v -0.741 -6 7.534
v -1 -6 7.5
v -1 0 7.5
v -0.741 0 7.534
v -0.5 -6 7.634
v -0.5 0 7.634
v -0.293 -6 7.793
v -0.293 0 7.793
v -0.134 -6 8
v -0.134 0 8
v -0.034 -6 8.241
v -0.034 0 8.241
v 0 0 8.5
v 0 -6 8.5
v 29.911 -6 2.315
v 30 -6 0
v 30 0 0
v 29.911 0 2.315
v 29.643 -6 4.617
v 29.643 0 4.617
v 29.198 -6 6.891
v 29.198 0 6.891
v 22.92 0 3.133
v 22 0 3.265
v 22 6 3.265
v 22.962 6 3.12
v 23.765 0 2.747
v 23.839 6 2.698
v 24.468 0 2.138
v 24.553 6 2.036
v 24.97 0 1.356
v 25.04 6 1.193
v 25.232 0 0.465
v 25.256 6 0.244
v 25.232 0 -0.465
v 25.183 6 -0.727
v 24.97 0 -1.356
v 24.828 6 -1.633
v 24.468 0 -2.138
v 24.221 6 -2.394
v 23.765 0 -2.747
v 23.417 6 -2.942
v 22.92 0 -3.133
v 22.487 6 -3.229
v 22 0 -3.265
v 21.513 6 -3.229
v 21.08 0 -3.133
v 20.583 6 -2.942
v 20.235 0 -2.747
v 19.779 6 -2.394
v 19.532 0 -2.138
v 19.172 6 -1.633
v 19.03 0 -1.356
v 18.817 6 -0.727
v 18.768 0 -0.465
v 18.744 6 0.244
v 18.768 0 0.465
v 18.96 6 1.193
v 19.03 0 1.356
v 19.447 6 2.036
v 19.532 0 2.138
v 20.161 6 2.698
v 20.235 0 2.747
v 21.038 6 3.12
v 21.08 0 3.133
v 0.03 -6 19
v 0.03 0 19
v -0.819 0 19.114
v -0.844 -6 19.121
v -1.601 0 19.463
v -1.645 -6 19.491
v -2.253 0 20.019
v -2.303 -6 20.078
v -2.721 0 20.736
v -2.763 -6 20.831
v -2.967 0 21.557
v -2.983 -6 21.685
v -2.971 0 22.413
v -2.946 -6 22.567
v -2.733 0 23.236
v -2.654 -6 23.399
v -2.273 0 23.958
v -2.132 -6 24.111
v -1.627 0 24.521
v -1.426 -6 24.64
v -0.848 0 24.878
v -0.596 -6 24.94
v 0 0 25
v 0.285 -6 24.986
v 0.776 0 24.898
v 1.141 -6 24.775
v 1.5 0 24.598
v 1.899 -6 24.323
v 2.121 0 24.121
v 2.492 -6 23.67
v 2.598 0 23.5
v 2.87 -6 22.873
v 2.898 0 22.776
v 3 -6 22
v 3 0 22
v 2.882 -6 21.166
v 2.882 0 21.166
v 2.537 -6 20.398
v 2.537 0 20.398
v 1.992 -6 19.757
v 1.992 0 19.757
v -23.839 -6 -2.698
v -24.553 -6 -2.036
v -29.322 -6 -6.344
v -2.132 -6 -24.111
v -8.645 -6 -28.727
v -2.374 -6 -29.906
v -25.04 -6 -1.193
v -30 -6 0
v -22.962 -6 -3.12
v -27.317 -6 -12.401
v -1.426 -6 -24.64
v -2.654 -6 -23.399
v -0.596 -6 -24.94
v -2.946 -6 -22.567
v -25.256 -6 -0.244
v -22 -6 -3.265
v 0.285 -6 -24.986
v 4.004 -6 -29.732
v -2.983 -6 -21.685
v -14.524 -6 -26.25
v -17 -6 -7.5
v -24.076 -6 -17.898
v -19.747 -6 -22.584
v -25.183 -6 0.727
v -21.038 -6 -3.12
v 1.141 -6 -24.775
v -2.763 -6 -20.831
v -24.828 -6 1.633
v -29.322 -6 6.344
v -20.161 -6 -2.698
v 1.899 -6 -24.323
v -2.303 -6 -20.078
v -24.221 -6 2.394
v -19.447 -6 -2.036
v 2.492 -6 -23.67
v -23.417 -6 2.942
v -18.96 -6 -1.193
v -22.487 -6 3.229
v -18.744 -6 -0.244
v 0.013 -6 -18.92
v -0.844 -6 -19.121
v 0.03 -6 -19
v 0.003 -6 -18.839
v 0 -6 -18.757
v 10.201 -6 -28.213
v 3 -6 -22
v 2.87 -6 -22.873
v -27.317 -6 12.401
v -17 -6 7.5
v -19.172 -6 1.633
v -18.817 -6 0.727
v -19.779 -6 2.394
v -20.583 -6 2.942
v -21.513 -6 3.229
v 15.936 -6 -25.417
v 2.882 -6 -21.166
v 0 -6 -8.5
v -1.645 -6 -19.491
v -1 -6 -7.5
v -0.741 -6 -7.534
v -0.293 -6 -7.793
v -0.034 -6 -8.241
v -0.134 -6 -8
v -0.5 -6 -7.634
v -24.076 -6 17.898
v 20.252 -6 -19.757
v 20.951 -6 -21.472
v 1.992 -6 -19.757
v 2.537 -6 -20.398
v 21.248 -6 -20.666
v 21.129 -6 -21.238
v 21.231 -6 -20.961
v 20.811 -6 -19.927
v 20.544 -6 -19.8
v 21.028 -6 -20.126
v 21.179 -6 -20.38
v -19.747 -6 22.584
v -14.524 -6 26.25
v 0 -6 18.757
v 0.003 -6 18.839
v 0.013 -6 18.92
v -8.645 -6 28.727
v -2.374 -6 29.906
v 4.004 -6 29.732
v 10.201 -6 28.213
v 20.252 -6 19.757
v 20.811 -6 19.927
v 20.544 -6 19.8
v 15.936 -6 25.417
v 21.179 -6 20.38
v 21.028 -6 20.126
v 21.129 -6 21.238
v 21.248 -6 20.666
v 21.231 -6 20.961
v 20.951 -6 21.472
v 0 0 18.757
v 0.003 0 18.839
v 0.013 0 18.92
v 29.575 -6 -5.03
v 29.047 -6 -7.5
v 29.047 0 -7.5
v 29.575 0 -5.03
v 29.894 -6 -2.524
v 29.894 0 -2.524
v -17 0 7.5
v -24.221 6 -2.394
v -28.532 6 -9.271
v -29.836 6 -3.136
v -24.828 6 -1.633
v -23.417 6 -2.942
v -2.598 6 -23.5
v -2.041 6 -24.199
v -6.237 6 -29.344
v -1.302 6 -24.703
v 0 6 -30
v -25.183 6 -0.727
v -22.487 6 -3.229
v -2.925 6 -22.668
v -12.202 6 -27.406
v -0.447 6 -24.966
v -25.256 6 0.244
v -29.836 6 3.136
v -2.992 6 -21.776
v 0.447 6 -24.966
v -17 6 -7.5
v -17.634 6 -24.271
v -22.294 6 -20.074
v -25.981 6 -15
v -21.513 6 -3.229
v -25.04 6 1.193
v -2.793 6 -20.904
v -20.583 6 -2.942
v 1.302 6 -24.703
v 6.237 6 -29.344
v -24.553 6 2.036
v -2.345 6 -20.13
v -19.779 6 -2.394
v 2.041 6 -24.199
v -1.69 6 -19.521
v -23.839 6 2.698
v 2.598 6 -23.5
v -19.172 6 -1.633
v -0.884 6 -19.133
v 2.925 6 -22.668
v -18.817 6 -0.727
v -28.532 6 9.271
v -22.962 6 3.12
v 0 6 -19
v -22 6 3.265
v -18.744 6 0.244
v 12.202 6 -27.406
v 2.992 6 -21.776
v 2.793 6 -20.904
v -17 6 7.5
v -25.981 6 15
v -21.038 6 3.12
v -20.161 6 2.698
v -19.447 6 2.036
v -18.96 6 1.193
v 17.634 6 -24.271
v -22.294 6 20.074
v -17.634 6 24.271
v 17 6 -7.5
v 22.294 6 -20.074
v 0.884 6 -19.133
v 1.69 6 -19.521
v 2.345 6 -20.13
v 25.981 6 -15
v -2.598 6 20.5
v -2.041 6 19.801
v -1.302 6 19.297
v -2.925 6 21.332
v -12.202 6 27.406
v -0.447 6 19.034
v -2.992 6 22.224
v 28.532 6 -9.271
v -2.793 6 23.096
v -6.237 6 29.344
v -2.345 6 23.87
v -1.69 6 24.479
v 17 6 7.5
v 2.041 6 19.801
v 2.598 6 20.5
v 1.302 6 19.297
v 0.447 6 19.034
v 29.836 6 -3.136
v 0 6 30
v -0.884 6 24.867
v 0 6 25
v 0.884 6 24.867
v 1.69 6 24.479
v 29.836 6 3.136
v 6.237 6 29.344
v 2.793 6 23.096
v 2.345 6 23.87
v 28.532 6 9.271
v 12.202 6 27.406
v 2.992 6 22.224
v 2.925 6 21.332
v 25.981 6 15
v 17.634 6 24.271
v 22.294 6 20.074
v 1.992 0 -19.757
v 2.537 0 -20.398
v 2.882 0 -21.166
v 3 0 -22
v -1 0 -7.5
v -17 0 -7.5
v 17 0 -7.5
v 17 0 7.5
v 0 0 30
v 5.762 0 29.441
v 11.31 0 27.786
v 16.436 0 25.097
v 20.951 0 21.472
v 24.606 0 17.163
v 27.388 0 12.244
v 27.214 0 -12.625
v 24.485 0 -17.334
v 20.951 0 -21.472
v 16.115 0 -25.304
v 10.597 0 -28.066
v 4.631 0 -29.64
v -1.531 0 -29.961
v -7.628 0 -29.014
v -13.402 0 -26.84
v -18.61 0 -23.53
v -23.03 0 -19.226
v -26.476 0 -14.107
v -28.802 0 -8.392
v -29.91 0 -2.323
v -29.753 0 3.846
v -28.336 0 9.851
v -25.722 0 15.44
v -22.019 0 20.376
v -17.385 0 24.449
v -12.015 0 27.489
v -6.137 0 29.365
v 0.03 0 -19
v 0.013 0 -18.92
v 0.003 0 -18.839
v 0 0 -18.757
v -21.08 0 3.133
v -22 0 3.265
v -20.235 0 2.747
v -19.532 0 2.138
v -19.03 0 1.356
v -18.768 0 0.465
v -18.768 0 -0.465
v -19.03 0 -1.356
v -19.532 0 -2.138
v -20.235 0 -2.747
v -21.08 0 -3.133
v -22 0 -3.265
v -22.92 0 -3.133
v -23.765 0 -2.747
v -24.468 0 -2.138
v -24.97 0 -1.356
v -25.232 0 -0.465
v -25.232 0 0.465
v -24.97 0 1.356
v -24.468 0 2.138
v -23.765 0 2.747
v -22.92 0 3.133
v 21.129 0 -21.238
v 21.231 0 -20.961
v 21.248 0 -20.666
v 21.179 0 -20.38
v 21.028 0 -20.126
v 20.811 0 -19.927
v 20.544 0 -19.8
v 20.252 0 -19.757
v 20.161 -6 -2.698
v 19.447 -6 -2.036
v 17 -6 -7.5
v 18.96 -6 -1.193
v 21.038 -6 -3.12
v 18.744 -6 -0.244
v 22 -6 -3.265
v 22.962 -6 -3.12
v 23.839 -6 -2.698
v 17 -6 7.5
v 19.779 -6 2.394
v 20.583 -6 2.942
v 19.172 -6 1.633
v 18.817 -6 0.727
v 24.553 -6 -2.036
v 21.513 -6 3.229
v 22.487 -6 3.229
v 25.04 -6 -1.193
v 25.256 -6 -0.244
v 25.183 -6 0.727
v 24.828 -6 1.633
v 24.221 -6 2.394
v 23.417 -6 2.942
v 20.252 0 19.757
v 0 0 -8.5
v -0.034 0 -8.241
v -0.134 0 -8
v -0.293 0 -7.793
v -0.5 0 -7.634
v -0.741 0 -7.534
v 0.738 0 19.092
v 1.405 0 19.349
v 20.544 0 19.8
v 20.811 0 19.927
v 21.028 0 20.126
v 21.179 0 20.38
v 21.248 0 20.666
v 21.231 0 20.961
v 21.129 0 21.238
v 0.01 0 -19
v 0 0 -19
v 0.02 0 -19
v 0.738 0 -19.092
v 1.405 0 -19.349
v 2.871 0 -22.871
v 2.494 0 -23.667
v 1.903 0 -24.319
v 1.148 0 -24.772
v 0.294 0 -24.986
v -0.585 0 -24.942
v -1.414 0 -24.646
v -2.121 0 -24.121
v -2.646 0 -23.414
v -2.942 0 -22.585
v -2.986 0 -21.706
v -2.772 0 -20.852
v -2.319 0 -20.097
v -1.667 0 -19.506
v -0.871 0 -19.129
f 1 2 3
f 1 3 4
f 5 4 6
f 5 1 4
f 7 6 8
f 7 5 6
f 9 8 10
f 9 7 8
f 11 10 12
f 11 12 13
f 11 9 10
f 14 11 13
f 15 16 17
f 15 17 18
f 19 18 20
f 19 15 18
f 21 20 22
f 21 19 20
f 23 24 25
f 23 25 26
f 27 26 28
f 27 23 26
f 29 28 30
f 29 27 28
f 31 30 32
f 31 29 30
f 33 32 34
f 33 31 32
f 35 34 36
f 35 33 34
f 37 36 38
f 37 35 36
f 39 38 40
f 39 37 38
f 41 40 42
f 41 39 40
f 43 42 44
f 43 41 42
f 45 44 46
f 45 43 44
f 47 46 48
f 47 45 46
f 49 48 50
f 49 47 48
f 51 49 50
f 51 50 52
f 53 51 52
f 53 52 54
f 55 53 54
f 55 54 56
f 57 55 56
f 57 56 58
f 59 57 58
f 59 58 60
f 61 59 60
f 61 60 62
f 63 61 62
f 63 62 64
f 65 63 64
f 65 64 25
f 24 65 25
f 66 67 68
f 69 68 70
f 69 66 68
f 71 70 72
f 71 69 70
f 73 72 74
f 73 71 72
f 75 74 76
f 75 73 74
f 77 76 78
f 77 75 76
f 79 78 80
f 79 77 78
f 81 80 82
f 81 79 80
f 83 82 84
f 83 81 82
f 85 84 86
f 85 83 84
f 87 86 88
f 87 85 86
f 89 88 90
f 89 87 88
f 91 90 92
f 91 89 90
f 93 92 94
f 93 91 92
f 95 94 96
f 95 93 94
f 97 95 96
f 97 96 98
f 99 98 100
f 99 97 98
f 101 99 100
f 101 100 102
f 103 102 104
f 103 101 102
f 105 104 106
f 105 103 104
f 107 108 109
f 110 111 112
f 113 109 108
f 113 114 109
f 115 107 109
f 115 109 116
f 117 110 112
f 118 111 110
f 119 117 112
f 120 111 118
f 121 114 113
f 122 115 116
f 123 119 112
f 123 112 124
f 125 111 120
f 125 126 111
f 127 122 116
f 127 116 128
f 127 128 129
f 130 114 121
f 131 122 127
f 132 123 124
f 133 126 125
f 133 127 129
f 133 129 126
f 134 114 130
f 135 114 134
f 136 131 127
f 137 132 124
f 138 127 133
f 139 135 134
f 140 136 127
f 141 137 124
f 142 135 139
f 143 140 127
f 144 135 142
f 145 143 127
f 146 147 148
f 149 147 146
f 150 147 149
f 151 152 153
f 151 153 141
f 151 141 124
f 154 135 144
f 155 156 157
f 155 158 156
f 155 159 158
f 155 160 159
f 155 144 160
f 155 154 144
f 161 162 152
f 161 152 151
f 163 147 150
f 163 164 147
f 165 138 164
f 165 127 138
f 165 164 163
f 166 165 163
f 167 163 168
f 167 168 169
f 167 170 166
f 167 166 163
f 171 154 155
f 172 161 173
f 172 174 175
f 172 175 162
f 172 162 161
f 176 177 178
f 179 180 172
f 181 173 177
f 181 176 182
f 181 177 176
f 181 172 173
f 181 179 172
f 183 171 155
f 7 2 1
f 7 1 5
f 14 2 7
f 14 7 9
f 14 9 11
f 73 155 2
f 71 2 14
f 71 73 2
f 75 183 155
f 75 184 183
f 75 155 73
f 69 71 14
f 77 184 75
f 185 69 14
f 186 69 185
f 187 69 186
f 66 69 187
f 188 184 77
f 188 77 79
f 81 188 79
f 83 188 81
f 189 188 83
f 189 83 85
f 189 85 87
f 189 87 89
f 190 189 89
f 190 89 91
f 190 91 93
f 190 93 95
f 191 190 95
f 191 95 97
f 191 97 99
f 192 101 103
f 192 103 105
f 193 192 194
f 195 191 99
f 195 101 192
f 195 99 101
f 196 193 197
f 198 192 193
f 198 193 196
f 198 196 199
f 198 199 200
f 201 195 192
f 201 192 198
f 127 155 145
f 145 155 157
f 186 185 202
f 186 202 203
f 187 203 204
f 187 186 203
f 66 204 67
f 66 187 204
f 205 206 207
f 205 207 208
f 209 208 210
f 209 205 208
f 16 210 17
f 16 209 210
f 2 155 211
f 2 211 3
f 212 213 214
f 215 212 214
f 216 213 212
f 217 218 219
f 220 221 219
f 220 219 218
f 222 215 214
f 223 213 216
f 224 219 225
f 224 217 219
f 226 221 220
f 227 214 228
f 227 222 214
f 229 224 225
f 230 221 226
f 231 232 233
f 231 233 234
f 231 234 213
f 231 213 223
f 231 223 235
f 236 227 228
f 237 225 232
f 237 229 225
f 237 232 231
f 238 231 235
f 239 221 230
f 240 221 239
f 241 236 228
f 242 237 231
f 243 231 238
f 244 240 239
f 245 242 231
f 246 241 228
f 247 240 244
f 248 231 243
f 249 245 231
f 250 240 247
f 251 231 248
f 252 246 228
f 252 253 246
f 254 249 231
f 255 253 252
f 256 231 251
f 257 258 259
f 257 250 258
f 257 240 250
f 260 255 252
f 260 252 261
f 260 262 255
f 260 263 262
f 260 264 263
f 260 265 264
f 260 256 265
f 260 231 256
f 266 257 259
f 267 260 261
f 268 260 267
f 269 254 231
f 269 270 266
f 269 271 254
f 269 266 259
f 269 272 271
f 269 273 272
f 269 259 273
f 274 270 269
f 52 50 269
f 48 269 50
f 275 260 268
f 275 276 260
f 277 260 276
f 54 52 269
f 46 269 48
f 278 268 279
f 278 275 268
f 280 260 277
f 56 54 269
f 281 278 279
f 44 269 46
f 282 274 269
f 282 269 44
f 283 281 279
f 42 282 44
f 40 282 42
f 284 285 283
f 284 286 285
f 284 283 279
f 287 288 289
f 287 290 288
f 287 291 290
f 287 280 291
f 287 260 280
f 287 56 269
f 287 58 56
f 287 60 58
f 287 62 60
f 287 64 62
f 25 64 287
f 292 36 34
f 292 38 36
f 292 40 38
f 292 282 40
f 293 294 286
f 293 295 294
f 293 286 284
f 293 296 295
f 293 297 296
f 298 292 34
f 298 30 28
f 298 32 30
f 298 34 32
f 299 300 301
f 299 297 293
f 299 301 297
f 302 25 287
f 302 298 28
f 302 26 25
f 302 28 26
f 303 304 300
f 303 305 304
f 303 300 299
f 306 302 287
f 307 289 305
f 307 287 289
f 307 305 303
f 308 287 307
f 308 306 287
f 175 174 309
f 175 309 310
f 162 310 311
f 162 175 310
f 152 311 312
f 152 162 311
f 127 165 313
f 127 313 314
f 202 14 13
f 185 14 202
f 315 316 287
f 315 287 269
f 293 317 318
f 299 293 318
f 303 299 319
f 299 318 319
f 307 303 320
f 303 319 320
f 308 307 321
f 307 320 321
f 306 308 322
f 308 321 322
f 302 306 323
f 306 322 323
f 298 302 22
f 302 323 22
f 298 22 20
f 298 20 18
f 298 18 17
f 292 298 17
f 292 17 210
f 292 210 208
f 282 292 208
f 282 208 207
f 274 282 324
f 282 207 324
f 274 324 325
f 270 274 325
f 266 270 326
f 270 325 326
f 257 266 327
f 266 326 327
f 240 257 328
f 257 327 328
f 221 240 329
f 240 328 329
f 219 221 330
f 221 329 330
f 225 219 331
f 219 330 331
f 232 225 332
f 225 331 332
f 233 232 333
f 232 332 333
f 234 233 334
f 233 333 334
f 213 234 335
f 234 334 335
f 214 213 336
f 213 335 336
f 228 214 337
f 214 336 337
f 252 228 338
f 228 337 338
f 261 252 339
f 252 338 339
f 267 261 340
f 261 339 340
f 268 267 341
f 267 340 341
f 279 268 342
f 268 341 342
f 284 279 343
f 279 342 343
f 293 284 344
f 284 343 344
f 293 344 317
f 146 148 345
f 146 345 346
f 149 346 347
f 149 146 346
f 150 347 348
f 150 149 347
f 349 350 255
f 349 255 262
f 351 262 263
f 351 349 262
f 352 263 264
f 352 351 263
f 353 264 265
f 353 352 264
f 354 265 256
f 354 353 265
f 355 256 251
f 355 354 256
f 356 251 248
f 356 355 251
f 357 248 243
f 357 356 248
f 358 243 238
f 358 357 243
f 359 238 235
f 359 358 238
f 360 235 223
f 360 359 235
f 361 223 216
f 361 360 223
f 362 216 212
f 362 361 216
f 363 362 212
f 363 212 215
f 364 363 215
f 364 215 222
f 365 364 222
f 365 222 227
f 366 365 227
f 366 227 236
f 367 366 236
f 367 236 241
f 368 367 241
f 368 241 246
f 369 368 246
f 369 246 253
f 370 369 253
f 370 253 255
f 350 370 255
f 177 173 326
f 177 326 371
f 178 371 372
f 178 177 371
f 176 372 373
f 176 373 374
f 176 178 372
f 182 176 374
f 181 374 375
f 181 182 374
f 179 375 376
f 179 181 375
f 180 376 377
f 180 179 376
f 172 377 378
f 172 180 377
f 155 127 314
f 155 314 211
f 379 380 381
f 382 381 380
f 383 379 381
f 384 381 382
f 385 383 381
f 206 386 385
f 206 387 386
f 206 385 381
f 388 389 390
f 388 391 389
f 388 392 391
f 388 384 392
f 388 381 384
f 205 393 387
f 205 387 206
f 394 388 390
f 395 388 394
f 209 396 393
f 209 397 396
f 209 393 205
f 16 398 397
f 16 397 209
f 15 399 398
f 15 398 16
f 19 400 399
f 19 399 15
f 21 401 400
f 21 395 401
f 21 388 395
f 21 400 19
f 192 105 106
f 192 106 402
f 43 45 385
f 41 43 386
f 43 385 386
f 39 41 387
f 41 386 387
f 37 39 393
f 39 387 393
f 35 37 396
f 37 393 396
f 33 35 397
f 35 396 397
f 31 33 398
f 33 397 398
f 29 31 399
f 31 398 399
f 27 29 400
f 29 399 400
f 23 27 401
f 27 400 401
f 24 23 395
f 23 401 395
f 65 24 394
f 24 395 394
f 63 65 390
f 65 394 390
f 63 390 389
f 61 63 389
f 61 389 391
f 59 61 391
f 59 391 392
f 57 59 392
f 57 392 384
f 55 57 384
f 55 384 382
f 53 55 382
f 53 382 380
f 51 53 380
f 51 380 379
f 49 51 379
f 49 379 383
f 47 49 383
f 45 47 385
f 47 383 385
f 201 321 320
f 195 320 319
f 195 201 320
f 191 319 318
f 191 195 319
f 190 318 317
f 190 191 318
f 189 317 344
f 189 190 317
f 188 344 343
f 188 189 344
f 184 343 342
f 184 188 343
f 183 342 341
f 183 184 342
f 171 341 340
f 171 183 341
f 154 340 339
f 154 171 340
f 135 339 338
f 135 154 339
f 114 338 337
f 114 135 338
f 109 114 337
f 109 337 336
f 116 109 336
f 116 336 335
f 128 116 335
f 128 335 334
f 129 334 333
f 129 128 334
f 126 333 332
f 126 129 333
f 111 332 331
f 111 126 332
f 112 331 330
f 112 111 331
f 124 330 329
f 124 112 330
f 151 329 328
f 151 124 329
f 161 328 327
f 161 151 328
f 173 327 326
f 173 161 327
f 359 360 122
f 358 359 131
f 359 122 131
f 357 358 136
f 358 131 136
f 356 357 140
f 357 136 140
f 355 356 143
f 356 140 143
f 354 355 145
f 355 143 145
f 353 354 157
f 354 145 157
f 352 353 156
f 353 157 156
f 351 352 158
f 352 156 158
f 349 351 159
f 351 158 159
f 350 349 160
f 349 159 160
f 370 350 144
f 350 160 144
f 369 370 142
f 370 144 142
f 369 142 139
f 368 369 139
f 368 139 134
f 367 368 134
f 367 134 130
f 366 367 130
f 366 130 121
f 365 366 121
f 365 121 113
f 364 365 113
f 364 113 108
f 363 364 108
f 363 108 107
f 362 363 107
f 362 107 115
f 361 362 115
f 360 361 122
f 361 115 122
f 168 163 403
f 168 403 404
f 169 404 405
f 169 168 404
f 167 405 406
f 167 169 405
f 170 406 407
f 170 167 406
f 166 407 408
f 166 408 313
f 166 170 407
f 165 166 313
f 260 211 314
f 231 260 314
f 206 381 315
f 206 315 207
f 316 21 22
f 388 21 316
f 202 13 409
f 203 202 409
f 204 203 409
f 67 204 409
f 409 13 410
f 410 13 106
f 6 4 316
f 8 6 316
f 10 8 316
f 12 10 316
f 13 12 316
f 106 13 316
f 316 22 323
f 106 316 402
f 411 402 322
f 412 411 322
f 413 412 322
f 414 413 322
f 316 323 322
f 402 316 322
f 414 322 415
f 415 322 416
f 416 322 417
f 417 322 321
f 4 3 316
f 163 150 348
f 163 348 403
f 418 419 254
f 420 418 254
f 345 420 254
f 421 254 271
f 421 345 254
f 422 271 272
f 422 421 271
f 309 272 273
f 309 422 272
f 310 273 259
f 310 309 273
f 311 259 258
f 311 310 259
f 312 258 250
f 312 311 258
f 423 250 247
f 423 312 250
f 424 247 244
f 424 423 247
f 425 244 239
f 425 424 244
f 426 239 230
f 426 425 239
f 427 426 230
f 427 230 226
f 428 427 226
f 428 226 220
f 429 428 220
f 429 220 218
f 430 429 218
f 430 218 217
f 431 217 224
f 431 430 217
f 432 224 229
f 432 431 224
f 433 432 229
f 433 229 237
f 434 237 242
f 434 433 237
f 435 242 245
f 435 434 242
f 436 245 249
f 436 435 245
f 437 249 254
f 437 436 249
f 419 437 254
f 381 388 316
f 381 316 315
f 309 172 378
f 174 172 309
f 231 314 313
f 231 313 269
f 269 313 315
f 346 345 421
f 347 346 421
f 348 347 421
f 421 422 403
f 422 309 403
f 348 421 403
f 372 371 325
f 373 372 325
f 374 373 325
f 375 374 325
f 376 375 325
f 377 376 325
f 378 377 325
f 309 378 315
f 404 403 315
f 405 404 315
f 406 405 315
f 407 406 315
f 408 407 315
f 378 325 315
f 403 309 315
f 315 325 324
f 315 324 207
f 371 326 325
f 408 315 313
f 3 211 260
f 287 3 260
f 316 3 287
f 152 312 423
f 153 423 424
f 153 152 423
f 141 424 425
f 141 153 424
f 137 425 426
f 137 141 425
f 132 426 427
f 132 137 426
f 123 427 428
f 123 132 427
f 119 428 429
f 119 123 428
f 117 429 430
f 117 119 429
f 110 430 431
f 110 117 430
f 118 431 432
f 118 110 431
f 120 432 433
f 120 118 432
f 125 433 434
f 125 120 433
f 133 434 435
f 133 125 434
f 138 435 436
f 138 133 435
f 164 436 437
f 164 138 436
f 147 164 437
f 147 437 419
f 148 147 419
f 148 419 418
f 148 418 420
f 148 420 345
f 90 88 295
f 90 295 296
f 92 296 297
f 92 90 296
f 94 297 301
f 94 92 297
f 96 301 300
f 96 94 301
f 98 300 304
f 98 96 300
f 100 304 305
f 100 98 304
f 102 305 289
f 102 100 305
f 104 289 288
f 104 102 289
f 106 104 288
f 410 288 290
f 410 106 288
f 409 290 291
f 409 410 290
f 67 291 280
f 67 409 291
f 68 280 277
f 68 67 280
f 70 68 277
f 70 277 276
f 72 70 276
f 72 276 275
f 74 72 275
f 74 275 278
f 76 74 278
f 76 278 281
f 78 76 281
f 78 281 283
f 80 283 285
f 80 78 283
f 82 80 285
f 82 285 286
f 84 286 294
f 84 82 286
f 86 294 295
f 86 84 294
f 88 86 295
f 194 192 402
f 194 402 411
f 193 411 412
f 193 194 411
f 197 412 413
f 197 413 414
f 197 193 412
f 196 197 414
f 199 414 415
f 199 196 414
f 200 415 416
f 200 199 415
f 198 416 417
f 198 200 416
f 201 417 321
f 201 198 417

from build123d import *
from build123d.topology import SkipClean

# Parameters (mm, degrees)
SKETCH1_R           = 30
SKETCH1_R_2         = 3.265274059
SKETCH1_R_3         = 3
SKETCH1_W           = 34
SKETCH1_H           = 15
BOSS_EXTRUDE1_DEPTH = 6
BOSS_EXTRUDE3_START = 6
SKETCH3_R           = 3.265274059
BOSS_EXTRUDE3_DEPTH = 6


with BuildPart() as part:
    # Sketch1 → Boss-Extrude1 (new body)
    with BuildSketch(Plane(origin=(0, 0, 0), x_dir=(1, 0, 0), z_dir=(0, 1, 0))):
        with Locations(Location((0, 0, 0), (0, 0, 270))):
            Circle(SKETCH1_R)
        with Locations(Location((-22, 0, 0), (0, 0, 270))):
            Circle(SKETCH1_R_2, mode=Mode.SUBTRACT)
        with Locations(Location((22, 0, 0), (0, 0, 270))):
            Circle(SKETCH1_R_2, mode=Mode.SUBTRACT)
        with Locations(Location((0, 22, 0), (0, 0, 270))):
            Circle(SKETCH1_R_3, mode=Mode.SUBTRACT)
        with Locations(Location((0, -22, 0), (0, 0, 270))):
            Circle(SKETCH1_R_3, mode=Mode.SUBTRACT)
        Rectangle(SKETCH1_W, SKETCH1_H, mode=Mode.SUBTRACT)
    extrude(amount=BOSS_EXTRUDE1_DEPTH)

    # Sketch3 → Boss-Extrude3 (add)
    # profile 1 of 2: a face of its own
    with SkipClean():  # the faces are left unmerged after this step: merging them gives an invalid solid
        with BuildSketch(Plane.XZ.offset(BOSS_EXTRUDE3_START)):
            with BuildLine():
                ThreePointArc((20.95075339, -21.472445888), (21.178609874, -20.379701801), (20.252394943, -19.756697692))
                Line((20.252394943, -19.756697692), (1.991882214, -19.756697692))
                ThreePointArc((1.991882214, -19.756697692), (2.736388737, -20.770294068), (3, -22))
                ThreePointArc((3, -22), (-2.13193129, -24.110656053), (0.030087351, -19.000150879))
                ThreePointArc((0.030087351, -19.000150879), (0.007550342, -18.879350355), (0, -18.756697692))
                Line((0, -18.756697692), (0, -8.5))
                ThreePointArc((0, -8.5), (-0.292893219, -7.792893219), (-1, -7.5))
                Line((-1, -7.5), (-16, -7.5))
                Line((-16, -7.5), (-17, -7.5))
                Line((-17, -7.5), (-17, -6.5))
                Line((-17, -6.5), (-17, 6.5))
                Line((-17, 6.5), (-17, 7.5))
                Line((-17, 7.5), (-16, 7.5))
                Line((-16, 7.5), (-1, 7.5))
                ThreePointArc((-1, 7.5), (-0.292893219, 7.792893219), (0, 8.5))
                Line((0, 8.5), (0, 18.756697692))
                ThreePointArc((0, 18.756697692), (0.007550342, 18.879350355), (0.030087351, 19.000150879))
                ThreePointArc((0.030087351, 19.000150879), (-2.13193129, 24.110656053), (3, 22))
                ThreePointArc((3, 22), (2.736388737, 20.770294068), (1.991882214, 19.756697692))
                Line((1.991882214, 19.756697692), (20.252394943, 19.756697692))
                ThreePointArc((20.252394943, 19.756697692), (21.178609874, 20.379701801), (20.95075339, 21.472445888))
                ThreePointArc((20.95075339, 21.472445888), (-30, 0), (20.95075339, -21.472445888))
            make_face()
            with Locations(Location((-22, 0, 0), (0, 0, 270))):
                Circle(SKETCH3_R, mode=Mode.SUBTRACT)
        # profile 2 of 2: a face of its own
        with BuildSketch(Plane.XZ.offset(BOSS_EXTRUDE3_START)):
            with BuildLine():
                Line((17, -7.5), (29.047375097, -7.5))
                ThreePointArc((29.047375097, -7.5), (29.760890888, -3.780128774), (30, 0))
                ThreePointArc((30, 0), (29.798804579, 3.468608603), (29.197916957, 6.890692662))
                Line((29.197916957, 6.890692662), (17, 7.5))
                Line((17, 7.5), (17, -7.5))
            make_face()
            with Locations(Location((22, 0, 0), (0, 0, 270))):
                Circle(SKETCH3_R, mode=Mode.SUBTRACT)
        extrude(amount=-BOSS_EXTRUDE3_DEPTH)


solid = part.part
